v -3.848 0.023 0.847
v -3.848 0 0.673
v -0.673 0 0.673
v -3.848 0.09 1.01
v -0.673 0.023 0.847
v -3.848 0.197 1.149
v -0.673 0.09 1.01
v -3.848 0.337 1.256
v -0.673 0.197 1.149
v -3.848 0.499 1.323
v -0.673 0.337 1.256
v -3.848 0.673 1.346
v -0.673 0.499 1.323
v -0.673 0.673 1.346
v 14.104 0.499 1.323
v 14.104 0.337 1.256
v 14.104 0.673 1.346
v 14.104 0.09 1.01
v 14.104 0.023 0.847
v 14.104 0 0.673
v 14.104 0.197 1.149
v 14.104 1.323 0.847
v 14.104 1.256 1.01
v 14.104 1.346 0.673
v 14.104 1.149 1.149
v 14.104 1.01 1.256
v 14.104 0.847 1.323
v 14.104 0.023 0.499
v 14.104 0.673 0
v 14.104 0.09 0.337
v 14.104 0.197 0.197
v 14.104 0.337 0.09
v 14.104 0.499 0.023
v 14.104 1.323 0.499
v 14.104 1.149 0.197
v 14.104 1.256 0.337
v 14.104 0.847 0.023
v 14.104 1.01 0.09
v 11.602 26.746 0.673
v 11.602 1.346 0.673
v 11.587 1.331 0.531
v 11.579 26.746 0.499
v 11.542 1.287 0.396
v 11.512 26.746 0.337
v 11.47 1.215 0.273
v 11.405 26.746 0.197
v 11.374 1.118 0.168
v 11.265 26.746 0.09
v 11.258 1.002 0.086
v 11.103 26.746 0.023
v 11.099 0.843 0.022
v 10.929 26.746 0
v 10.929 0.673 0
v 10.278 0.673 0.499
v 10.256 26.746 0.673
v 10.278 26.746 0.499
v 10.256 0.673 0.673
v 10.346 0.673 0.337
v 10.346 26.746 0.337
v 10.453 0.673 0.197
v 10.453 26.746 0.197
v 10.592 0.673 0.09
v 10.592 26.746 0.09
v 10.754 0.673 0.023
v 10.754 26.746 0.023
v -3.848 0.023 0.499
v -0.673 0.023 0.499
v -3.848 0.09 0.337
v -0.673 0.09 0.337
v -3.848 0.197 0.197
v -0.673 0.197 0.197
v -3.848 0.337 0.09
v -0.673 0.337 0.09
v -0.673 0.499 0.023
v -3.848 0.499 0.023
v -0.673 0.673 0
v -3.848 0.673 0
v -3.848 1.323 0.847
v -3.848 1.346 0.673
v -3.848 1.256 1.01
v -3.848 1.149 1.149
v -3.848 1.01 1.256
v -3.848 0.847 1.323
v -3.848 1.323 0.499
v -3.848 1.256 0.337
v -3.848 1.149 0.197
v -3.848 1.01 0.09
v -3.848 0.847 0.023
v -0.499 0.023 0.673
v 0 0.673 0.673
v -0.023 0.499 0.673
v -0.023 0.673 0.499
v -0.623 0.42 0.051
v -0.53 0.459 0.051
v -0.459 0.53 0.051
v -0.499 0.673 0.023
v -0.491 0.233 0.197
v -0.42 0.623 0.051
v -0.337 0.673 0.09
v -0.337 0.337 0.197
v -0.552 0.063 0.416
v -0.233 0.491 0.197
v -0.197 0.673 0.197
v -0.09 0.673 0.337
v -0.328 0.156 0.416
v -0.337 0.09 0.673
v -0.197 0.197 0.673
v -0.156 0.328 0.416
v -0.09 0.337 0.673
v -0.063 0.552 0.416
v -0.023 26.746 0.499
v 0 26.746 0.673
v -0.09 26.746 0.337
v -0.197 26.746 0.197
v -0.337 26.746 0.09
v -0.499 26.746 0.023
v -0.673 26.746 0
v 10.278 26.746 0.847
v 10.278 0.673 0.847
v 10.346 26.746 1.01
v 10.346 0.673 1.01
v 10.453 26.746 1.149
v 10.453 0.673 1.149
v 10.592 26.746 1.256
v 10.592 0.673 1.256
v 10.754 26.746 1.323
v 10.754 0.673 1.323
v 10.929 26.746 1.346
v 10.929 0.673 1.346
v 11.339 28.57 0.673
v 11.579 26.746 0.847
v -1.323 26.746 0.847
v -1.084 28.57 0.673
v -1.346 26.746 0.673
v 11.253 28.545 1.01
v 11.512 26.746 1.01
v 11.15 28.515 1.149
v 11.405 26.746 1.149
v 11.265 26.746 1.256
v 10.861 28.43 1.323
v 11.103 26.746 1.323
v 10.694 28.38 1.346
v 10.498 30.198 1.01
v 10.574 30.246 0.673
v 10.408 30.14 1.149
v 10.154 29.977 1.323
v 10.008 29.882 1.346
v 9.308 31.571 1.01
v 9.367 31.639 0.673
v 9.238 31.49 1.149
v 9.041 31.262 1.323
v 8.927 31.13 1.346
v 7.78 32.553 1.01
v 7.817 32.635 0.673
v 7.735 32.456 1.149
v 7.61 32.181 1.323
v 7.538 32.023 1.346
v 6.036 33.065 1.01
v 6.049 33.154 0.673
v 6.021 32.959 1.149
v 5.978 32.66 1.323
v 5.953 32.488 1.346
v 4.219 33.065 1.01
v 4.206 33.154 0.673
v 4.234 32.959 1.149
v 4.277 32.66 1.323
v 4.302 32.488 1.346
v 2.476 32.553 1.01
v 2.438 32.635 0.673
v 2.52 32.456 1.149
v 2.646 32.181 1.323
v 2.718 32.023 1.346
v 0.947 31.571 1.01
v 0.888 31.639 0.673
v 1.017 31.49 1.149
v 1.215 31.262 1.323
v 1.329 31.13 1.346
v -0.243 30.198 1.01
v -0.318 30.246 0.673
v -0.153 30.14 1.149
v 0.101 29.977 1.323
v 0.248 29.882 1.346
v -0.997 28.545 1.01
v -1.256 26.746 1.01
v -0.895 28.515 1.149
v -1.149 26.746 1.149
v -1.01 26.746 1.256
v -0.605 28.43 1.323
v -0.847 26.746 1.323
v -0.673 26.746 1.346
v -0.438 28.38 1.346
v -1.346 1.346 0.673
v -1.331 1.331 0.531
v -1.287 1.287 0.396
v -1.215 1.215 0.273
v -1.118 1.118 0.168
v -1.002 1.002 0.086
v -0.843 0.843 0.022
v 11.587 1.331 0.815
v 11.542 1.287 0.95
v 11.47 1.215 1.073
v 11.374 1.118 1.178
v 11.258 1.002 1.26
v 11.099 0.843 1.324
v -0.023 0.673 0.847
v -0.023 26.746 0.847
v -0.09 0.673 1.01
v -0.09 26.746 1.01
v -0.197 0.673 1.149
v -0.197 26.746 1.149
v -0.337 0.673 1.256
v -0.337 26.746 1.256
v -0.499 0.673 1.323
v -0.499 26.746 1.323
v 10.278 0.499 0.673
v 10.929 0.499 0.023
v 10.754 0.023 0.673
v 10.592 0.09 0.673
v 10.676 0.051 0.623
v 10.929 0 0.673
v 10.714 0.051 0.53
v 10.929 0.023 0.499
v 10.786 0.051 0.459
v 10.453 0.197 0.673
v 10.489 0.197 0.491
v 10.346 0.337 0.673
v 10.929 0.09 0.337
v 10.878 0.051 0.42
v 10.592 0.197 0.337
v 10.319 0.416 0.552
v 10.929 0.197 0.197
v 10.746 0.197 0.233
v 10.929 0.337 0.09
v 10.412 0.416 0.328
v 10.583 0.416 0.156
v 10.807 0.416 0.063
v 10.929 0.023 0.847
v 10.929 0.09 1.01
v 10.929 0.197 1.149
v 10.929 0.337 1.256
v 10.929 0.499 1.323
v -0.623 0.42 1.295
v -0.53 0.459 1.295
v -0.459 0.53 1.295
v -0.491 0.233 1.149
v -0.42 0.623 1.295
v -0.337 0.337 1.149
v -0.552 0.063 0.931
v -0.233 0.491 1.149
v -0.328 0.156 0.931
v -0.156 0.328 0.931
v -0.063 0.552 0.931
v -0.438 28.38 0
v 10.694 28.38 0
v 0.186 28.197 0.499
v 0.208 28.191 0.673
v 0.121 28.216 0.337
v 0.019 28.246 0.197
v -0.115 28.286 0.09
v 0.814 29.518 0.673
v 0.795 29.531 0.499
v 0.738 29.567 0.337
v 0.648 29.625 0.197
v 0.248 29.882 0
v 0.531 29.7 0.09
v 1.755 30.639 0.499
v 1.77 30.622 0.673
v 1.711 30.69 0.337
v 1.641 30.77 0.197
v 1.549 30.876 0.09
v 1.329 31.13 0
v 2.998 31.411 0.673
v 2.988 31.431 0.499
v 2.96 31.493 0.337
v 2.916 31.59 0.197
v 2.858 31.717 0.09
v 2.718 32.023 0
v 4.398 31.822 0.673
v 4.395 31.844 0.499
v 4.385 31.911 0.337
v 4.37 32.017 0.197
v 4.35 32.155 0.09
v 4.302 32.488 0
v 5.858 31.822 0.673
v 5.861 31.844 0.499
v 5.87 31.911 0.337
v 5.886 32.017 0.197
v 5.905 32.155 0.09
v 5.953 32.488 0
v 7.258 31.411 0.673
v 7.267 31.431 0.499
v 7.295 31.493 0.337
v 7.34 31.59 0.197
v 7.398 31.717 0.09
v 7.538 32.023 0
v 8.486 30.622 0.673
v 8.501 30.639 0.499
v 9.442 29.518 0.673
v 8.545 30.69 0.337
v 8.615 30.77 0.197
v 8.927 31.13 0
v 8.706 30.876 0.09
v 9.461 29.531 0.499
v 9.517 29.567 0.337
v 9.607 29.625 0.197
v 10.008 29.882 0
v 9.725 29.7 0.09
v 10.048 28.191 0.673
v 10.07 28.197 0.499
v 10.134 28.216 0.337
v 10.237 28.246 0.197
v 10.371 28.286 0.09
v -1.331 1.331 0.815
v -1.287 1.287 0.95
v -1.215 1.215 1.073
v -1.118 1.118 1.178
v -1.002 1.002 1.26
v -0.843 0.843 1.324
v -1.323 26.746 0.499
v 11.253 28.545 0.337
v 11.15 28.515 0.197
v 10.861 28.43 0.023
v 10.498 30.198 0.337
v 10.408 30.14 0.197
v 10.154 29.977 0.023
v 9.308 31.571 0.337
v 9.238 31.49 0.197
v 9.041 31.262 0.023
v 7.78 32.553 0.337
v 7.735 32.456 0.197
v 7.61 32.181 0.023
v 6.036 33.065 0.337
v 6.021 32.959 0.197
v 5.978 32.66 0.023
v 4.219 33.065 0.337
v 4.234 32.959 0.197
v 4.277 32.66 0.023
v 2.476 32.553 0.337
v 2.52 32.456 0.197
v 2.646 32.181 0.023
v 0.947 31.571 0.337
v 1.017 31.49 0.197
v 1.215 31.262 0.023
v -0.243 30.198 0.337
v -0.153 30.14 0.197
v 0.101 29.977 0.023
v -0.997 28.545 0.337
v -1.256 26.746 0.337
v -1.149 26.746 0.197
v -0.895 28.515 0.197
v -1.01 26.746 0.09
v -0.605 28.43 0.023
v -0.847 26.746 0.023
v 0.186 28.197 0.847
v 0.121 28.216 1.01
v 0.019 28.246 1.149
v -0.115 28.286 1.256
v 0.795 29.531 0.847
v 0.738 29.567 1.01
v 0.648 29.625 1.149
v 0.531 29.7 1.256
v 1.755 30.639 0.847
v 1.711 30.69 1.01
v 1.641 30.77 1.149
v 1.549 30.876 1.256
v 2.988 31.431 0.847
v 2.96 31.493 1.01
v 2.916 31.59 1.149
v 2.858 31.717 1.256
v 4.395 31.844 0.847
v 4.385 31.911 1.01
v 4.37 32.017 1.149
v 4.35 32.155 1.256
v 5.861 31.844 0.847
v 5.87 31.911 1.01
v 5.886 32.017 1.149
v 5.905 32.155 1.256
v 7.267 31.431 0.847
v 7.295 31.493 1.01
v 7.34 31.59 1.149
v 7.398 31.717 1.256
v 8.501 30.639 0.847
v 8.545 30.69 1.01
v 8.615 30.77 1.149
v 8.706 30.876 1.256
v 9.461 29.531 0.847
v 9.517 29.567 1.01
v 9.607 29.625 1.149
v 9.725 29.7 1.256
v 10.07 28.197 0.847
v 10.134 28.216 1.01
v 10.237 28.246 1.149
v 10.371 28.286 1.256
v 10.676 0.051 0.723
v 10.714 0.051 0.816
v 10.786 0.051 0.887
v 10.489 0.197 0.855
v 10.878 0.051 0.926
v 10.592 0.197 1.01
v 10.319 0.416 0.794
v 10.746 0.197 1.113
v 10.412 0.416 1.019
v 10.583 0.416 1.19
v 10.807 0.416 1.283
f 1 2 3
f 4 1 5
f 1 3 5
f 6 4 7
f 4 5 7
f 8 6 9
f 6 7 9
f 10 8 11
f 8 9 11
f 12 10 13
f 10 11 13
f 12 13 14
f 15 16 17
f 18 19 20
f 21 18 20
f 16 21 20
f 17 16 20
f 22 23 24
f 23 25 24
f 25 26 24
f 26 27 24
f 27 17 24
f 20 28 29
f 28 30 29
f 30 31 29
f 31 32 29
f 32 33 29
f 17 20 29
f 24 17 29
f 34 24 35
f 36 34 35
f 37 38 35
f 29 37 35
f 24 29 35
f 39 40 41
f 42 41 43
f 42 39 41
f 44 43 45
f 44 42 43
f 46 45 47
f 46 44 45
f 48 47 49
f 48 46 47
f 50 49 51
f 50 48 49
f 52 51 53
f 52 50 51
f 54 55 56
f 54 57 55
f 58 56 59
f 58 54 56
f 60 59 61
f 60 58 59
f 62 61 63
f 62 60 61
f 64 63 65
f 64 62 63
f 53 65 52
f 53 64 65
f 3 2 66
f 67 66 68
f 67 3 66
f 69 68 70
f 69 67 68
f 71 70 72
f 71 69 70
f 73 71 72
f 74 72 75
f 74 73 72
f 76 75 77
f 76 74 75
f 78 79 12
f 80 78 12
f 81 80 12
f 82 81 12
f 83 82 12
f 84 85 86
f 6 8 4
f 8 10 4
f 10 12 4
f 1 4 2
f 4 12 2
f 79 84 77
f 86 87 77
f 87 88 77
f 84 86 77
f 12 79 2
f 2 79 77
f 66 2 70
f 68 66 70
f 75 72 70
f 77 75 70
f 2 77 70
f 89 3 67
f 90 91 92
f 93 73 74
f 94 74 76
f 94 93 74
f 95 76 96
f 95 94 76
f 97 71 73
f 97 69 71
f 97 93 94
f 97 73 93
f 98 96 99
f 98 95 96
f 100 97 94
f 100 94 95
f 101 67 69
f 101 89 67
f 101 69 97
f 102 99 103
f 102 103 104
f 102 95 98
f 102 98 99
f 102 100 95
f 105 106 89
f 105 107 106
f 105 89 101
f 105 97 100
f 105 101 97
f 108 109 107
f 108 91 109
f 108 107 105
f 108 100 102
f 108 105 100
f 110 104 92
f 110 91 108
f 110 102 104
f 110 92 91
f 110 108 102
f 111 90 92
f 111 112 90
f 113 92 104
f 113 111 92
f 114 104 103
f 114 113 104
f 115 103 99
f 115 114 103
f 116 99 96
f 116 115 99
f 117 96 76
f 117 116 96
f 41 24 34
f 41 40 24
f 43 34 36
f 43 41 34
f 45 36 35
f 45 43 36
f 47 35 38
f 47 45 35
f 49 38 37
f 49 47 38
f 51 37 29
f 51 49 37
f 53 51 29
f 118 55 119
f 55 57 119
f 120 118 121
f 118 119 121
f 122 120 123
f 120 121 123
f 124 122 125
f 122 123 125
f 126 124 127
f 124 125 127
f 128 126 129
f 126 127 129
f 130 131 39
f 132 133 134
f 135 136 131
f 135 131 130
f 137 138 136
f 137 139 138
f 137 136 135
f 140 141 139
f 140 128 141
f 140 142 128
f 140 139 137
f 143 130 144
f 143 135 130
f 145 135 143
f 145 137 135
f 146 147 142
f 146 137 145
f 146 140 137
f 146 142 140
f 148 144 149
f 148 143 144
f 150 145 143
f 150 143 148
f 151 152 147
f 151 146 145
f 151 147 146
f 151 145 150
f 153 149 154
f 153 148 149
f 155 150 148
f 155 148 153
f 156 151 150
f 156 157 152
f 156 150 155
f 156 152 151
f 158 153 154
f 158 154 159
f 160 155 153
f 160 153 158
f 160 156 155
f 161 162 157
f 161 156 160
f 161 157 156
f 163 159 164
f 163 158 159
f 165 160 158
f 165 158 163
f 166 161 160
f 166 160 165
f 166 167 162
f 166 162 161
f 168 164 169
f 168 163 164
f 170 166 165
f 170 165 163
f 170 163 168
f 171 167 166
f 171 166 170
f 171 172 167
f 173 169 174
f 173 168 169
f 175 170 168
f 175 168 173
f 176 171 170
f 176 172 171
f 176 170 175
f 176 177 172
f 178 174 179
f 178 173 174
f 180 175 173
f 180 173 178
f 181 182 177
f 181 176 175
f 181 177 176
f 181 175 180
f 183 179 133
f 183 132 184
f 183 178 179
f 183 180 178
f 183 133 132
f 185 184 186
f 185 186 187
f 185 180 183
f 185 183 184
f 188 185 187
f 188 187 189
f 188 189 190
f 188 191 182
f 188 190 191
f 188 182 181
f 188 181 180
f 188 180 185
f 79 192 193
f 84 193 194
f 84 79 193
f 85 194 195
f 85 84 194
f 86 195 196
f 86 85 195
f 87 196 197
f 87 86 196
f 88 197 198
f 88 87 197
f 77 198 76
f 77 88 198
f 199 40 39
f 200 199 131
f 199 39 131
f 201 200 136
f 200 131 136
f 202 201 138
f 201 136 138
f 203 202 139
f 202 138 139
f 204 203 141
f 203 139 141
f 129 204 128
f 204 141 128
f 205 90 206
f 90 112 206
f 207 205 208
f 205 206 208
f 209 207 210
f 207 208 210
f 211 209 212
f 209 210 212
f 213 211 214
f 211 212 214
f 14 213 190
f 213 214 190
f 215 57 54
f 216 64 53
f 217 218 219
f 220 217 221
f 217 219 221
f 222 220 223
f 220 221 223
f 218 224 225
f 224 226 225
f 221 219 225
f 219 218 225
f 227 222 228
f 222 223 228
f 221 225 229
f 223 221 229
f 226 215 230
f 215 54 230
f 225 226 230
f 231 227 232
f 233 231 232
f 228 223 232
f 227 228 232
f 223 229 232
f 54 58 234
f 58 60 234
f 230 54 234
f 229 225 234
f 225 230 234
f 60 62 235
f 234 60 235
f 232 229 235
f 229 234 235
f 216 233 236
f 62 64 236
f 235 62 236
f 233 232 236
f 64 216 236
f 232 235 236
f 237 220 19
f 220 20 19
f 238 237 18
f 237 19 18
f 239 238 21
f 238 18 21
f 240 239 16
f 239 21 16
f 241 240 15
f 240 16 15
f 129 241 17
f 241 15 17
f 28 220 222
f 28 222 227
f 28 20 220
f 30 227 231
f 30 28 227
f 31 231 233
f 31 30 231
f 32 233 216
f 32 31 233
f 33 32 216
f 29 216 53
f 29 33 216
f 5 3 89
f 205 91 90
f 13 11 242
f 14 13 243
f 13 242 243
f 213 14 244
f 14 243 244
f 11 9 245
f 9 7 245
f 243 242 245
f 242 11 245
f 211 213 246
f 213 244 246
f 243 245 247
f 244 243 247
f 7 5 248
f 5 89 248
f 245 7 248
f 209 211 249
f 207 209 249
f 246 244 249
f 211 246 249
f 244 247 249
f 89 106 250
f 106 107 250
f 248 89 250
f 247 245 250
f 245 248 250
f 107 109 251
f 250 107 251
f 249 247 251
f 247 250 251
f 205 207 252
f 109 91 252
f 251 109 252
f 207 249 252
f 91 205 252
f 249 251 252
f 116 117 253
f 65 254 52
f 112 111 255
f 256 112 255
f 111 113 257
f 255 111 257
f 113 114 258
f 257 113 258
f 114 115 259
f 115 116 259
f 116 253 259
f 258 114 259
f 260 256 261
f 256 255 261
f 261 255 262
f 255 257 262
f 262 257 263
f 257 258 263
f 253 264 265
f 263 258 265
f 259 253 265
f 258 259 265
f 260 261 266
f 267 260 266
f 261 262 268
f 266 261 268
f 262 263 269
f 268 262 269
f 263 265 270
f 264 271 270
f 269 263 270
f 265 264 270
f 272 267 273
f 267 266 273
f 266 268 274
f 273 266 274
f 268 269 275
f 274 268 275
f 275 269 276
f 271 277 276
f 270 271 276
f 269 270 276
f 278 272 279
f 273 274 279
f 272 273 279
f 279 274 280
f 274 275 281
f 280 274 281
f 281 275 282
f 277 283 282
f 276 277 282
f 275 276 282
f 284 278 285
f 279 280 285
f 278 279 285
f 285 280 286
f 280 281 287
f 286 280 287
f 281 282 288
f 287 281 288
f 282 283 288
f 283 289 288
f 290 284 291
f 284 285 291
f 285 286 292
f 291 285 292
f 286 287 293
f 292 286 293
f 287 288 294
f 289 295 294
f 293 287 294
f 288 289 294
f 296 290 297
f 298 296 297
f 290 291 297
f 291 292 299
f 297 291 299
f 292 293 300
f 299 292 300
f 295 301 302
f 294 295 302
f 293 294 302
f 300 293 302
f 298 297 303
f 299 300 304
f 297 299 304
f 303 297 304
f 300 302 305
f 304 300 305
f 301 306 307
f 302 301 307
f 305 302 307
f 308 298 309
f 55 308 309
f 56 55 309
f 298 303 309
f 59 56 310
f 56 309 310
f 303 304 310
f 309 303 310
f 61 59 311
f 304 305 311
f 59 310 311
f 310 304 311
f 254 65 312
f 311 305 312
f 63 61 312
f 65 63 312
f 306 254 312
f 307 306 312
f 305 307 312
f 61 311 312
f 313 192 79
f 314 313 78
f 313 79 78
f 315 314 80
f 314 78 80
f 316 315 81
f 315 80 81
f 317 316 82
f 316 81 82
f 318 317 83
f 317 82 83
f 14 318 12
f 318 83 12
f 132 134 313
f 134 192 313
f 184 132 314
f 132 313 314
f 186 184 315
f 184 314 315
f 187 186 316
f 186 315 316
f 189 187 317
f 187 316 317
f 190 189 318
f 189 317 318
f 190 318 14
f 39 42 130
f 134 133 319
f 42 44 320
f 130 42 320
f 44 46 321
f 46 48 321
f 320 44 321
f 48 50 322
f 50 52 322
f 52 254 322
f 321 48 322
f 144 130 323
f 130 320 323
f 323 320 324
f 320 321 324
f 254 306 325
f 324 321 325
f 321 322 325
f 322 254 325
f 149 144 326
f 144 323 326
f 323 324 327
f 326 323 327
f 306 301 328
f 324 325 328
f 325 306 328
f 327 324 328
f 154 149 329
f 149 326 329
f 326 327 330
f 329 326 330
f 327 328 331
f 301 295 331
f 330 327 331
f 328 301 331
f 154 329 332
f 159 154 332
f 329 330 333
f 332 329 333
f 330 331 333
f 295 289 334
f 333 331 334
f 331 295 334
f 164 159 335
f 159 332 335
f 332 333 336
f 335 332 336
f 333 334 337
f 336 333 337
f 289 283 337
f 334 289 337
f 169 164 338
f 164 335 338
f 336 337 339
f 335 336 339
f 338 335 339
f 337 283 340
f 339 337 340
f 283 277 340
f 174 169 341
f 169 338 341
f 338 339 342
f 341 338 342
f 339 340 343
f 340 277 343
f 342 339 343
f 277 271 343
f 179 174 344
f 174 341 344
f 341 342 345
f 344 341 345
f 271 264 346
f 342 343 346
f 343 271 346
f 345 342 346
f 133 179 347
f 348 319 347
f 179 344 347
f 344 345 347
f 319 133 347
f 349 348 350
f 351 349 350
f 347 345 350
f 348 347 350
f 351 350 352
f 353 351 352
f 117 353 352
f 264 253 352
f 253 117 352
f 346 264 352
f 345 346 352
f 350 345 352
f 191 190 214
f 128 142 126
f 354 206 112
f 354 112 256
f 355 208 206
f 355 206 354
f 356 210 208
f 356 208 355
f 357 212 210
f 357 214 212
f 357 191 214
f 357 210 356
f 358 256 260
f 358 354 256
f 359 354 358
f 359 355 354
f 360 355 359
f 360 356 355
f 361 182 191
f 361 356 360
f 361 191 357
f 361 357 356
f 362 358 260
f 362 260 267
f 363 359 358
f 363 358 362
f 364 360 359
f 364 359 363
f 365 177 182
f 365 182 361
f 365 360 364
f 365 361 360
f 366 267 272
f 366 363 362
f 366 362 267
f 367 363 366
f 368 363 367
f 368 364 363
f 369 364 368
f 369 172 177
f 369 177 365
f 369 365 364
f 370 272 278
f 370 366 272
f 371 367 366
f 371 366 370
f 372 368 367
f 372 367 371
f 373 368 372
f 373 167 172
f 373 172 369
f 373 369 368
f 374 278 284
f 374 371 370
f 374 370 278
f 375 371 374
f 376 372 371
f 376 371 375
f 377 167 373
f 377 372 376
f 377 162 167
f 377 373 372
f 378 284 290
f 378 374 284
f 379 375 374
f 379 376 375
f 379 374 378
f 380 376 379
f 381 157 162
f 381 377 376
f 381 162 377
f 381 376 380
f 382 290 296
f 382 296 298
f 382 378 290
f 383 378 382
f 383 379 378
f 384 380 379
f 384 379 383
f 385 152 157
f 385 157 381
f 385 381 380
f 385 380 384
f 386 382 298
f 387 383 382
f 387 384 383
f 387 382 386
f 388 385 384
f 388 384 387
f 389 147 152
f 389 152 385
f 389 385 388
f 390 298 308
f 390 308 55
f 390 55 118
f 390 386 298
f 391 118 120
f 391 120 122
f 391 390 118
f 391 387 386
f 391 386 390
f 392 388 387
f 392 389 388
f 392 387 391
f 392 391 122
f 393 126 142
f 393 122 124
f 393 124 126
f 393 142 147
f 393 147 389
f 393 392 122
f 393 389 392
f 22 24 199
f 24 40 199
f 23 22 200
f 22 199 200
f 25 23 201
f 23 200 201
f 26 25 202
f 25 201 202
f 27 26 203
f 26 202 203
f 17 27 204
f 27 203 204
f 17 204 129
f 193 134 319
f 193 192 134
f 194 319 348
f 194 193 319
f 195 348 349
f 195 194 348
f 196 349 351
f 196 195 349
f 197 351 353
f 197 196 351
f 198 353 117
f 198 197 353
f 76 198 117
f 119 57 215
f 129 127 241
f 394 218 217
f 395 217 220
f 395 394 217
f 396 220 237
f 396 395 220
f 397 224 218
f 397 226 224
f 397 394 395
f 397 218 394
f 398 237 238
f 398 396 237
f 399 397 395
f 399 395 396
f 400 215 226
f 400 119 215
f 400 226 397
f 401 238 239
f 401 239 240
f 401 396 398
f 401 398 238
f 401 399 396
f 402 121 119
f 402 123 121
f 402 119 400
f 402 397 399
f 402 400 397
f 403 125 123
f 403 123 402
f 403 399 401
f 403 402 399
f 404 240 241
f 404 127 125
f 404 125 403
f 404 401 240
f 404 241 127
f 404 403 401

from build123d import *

# Parameters (mm, degrees)
F1_DEPTH = 1.3462
F2_R     = 0.67309


# Not quite as in the source:
# - a fillet or chamfer is up to 0.001 mm smaller than in the source, because OpenCascade refuses the exact size


with BuildPart() as f1:
    # F0 (on Top) → F1 (new body)
    with BuildSketch(Plane.XY):
        with BuildLine():
            Line((-3.8481, 0), (0, 0))
            Line((0, 0), (0, 26.7462))
            ThreePointArc((0, 26.7462), (5.1277647, 31.8739647), (10.2555294, 26.7462))
            Line((10.2555294, 26.7462), (10.2555294, 0))
            Line((10.2555294, 0), (14.1036294, 0))
            Line((14.1036294, 0), (14.1036294, 1.3462))
            Line((14.1036294, 1.3462), (11.6017294, 1.3462))
            Line((11.6017294, 1.3462), (11.6017294, 26.7462))
            ThreePointArc((11.6017294, 26.7462), (5.1277647, 33.2201647), (-1.3462, 26.7462))
            Line((-1.3462, 26.7462), (-1.3462, 1.3462))
            Line((-1.3462, 1.3462), (-3.8481, 1.3462))
            Line((-3.8481, 1.3462), (-3.8481, 0))
        make_face()
    extrude(amount=F1_DEPTH)

    # F2 (radius 0.6731 in the source; OpenCascade refuses exactly that, so slightly less here)
    f2_edges = [f1.edges().sort_by_distance(p)[0] for p in [
        (0, 0, 0.6731),
        (-1.92405, 0, 1.3462),
        (-1.92405, 0, 0),
        (0, 13.3731, 1.3462),
        (0, 13.3731, 0),
        (5.127765, 31.873965, 1.3462),
        (5.127765, 31.873965, 0),
        (10.255529, 13.3731, 1.3462),
        (11.601729, 14.0462, 1.3462),
        (11.601729, 14.0462, 0),
        (5.127765, 33.220165, 0),
        (5.127765, 33.220165, 1.3462),
        (10.255529, 0, 0.6731),
        (10.255529, 13.3731, 0),
        (12.179579, 0, 1.3462),
        (12.179579, 0, 0),
        (12.852679, 1.3462, 0),
        (12.852679, 1.3462, 1.3462),
        (-2.59715, 1.3462, 1.3462),
        (-2.59715, 1.3462, 0),
    ]]
    fillet(f2_edges, radius=F2_R)


solid = f1.part
